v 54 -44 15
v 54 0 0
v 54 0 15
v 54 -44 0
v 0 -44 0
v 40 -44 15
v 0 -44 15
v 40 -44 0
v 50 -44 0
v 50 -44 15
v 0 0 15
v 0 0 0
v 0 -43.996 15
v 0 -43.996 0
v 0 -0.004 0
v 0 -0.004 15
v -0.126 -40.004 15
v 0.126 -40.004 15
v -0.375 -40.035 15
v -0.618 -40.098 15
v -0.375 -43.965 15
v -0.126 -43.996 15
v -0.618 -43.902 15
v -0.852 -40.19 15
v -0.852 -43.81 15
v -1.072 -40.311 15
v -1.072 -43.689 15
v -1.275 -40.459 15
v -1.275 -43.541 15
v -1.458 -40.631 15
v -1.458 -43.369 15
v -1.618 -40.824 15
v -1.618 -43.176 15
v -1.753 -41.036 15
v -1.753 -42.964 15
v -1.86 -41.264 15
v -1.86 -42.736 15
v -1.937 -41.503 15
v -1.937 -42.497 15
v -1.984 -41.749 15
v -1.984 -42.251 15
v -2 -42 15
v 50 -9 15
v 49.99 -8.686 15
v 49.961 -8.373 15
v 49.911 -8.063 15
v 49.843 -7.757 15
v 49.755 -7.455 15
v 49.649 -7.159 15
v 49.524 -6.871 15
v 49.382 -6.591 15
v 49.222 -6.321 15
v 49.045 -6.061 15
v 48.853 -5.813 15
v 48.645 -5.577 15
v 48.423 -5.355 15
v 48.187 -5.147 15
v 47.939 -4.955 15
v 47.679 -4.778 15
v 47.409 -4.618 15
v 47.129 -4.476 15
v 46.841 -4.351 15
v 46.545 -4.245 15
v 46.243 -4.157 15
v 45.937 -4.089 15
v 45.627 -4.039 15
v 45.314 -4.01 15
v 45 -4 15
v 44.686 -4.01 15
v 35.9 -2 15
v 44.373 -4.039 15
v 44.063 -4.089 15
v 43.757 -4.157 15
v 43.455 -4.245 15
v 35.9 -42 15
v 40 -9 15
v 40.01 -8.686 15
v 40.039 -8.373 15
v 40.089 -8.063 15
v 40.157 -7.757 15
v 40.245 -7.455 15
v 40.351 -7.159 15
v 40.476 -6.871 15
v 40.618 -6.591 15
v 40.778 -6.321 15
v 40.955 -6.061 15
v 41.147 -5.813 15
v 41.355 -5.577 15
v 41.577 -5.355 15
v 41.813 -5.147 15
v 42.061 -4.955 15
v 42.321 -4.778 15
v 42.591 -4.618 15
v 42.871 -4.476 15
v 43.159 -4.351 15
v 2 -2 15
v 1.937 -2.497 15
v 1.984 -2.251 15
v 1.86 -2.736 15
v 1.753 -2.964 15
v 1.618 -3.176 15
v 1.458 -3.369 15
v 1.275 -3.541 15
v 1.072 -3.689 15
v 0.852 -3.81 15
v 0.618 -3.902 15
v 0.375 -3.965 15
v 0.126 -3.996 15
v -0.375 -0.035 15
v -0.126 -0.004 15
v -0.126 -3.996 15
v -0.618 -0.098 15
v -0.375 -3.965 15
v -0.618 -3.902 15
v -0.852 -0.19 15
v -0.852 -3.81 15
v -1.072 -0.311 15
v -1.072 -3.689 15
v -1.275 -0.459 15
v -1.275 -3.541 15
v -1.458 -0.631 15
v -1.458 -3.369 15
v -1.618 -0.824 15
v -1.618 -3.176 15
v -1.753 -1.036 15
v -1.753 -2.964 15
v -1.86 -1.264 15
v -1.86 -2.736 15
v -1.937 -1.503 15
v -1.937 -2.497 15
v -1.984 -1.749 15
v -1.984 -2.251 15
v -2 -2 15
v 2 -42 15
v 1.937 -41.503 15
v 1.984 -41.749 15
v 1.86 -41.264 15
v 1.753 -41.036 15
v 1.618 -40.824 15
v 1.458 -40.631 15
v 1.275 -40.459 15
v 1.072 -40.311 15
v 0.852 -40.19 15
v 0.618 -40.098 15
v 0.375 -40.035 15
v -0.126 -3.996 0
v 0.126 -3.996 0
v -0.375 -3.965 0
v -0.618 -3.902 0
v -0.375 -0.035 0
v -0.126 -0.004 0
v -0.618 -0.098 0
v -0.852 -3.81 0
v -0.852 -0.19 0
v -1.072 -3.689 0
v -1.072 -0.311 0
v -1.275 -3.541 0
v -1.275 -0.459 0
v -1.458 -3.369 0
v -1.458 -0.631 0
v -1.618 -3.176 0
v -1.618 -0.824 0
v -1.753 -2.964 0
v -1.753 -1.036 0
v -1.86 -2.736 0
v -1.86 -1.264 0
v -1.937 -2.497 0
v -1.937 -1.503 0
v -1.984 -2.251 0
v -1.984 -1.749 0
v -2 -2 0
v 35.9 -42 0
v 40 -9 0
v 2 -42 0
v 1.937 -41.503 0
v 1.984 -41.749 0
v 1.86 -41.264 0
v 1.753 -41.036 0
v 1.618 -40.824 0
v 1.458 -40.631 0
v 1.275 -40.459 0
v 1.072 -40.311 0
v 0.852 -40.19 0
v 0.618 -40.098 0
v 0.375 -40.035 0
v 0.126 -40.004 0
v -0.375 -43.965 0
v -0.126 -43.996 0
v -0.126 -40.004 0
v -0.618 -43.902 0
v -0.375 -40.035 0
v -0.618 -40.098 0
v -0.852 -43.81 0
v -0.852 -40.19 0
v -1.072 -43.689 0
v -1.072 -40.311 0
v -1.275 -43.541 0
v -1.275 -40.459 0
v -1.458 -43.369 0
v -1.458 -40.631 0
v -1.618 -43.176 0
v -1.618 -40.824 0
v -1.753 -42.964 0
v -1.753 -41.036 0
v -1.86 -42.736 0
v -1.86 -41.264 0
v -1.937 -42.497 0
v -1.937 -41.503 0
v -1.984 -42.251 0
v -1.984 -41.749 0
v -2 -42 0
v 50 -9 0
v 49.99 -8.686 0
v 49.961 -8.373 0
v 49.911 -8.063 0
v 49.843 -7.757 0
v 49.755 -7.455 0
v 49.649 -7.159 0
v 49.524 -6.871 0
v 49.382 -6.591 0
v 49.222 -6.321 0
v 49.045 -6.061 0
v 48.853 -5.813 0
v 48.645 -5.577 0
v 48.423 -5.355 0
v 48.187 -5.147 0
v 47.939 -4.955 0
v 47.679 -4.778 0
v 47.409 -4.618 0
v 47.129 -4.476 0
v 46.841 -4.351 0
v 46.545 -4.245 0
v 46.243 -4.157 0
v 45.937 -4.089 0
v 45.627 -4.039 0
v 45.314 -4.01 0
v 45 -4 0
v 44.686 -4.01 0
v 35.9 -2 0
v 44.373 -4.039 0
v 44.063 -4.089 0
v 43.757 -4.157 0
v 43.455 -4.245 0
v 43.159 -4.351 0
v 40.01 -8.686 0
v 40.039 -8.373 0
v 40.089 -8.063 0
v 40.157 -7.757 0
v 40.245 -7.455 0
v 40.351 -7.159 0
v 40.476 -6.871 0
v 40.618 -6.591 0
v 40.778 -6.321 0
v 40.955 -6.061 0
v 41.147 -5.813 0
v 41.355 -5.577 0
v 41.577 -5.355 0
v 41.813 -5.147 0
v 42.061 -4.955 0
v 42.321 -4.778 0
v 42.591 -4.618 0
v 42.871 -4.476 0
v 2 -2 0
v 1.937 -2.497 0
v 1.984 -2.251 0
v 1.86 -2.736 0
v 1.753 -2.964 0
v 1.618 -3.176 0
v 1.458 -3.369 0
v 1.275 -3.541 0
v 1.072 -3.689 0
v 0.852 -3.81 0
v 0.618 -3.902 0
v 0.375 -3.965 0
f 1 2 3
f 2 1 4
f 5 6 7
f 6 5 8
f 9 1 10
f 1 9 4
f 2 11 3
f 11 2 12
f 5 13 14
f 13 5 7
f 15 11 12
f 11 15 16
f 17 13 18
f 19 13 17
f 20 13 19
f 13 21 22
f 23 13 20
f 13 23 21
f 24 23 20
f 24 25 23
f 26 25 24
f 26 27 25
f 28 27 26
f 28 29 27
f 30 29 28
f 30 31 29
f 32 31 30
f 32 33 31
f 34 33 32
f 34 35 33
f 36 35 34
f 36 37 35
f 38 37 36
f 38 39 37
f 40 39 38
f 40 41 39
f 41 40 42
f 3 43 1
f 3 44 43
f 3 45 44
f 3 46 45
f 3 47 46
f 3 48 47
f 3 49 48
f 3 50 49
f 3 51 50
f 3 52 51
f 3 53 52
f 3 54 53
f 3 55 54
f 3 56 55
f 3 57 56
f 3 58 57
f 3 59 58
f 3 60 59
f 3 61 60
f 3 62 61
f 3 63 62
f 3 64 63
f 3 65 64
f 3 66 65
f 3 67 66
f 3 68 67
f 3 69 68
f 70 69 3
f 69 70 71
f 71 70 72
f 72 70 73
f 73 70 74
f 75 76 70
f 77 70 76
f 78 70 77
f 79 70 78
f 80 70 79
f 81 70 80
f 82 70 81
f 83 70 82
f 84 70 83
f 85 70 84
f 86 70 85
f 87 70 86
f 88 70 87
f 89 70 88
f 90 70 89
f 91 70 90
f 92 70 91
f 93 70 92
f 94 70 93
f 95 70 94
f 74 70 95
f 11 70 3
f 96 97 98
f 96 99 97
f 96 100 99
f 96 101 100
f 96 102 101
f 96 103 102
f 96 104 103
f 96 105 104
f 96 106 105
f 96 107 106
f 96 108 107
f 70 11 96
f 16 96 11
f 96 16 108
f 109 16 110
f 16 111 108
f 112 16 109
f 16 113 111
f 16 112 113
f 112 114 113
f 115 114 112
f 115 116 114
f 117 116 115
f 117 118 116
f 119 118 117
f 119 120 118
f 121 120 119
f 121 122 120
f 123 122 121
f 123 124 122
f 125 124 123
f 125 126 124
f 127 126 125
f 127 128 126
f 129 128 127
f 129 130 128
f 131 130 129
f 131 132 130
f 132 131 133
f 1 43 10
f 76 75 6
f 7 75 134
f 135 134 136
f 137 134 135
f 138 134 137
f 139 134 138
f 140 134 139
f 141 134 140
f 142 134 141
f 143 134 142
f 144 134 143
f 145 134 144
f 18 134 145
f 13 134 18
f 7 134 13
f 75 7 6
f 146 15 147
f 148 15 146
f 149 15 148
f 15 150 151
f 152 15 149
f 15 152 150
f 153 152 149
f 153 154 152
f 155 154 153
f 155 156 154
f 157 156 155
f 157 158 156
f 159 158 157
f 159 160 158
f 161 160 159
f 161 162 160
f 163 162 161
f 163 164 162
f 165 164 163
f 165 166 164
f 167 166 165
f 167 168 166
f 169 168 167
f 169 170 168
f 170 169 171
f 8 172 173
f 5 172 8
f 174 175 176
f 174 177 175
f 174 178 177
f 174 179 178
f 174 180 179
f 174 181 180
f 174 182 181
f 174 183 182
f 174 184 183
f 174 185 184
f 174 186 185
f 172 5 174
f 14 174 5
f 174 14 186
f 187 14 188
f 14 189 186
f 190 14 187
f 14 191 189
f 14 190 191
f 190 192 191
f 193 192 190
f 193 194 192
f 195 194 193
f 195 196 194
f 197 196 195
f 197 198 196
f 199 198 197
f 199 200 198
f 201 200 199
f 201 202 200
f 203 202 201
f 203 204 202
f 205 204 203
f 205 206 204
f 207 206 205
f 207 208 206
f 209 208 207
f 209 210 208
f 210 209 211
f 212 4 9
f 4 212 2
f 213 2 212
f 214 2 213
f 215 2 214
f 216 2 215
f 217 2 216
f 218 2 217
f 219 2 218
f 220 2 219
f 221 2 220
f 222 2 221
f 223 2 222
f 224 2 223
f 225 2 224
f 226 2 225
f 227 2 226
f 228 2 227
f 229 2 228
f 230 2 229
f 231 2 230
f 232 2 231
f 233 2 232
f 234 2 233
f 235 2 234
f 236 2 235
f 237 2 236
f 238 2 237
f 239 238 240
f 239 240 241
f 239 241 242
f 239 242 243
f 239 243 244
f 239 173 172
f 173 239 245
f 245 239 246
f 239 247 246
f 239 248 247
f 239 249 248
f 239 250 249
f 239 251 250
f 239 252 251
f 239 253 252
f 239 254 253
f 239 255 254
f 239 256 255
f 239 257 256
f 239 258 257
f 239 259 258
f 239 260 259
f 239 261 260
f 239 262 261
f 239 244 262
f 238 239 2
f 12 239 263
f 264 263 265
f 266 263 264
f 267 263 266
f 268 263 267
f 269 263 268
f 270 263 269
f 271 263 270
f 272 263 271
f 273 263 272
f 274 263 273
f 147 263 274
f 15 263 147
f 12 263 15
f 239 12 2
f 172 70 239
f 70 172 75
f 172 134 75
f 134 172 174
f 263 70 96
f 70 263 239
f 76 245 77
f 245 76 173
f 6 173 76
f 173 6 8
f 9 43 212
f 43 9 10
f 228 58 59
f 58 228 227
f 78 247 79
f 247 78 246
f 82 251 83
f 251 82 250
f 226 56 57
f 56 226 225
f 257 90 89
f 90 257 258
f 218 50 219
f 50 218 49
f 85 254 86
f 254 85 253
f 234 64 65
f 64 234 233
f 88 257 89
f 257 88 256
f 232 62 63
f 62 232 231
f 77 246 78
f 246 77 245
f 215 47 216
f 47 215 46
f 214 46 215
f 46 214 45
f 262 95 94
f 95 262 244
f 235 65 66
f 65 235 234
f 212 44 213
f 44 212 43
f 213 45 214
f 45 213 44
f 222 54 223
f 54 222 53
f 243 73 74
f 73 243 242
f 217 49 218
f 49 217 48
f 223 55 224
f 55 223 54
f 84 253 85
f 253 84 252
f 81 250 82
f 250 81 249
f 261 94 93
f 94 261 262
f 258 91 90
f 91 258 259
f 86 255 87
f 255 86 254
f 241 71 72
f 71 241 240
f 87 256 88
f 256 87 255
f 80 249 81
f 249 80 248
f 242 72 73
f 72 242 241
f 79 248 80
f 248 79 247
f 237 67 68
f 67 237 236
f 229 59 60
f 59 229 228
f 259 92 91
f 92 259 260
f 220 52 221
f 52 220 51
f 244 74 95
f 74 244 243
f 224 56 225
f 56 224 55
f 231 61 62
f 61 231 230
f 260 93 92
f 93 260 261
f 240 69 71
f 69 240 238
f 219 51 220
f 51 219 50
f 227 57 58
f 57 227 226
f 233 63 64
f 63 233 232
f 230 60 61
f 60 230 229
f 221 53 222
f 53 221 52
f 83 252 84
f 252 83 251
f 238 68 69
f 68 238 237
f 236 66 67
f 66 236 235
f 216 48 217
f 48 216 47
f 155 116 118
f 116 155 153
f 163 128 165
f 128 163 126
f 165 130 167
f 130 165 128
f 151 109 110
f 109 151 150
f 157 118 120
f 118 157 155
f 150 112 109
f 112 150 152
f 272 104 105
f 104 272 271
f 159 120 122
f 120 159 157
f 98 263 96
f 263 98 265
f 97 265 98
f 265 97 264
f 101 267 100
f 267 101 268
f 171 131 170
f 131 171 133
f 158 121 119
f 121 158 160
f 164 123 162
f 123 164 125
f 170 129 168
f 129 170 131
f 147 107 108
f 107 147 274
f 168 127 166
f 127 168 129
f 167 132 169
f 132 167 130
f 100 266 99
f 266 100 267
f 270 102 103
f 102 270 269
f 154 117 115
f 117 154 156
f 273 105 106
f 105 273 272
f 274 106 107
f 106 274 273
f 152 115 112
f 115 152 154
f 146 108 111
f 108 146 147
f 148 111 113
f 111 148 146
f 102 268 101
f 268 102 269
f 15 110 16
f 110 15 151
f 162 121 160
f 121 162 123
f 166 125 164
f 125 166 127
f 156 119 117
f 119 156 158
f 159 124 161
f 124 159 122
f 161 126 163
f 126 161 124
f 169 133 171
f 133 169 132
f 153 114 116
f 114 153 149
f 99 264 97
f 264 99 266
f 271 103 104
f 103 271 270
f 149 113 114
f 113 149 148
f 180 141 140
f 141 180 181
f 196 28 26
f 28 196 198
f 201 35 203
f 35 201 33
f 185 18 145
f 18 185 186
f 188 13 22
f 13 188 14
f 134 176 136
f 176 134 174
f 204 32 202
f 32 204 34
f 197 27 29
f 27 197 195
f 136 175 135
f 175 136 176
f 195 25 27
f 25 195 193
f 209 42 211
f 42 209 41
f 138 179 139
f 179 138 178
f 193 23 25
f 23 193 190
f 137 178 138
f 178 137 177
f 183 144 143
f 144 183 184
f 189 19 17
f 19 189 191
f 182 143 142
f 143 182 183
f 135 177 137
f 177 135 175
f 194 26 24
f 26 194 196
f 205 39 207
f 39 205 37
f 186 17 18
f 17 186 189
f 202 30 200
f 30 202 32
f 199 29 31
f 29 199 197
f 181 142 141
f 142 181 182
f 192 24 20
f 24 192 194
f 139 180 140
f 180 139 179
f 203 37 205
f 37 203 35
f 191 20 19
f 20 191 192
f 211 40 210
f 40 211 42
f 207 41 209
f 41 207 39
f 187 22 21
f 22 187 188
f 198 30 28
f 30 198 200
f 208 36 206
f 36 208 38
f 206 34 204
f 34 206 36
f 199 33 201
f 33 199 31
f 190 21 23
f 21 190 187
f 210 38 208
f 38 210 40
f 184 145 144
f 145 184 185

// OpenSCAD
$desk_height = 40;
$width =  15;
$depth = 50;
$cable_diameter = 10;
$wall_thickness = 2;

rotate([90, 0, 0])
{

difference()
{
    cube([$depth + $wall_thickness * 2, $width, $desk_height + $wall_thickness * 2]);

    translate([-0.1, -$wall_thickness / 2, $wall_thickness])
    cube([$depth-$cable_diameter - $wall_thickness * 2, $width + $wall_thickness, $desk_height]);

    hull()
    {
        rotate([-90, 0, 0])
            translate([$depth - $cable_diameter / 2, -$cable_diameter / 2 - $wall_thickness * 2, -1])
                cylinder($width + $wall_thickness, $cable_diameter / 2, $cable_diameter / 2, $fn = 100);

        rotate([-90, 0, 0])
            translate([$depth - $cable_diameter / 2, -$desk_height - $wall_thickness * 2, -1])
                cylinder($width+2, $cable_diameter / 2, $cable_diameter / 2, $fn = 100);
    }
}

translate([0, 0, $wall_thickness])
    rotate([-90, 0, 0])
        cylinder($width, $wall_thickness, $wall_thickness, $fn = 50);

translate([0, 0, , $desk_height + $wall_thickness])
    rotate([-90, 0, 0])
        cylinder($width, $wall_thickness, $wall_thickness, $fn = 50);
}
